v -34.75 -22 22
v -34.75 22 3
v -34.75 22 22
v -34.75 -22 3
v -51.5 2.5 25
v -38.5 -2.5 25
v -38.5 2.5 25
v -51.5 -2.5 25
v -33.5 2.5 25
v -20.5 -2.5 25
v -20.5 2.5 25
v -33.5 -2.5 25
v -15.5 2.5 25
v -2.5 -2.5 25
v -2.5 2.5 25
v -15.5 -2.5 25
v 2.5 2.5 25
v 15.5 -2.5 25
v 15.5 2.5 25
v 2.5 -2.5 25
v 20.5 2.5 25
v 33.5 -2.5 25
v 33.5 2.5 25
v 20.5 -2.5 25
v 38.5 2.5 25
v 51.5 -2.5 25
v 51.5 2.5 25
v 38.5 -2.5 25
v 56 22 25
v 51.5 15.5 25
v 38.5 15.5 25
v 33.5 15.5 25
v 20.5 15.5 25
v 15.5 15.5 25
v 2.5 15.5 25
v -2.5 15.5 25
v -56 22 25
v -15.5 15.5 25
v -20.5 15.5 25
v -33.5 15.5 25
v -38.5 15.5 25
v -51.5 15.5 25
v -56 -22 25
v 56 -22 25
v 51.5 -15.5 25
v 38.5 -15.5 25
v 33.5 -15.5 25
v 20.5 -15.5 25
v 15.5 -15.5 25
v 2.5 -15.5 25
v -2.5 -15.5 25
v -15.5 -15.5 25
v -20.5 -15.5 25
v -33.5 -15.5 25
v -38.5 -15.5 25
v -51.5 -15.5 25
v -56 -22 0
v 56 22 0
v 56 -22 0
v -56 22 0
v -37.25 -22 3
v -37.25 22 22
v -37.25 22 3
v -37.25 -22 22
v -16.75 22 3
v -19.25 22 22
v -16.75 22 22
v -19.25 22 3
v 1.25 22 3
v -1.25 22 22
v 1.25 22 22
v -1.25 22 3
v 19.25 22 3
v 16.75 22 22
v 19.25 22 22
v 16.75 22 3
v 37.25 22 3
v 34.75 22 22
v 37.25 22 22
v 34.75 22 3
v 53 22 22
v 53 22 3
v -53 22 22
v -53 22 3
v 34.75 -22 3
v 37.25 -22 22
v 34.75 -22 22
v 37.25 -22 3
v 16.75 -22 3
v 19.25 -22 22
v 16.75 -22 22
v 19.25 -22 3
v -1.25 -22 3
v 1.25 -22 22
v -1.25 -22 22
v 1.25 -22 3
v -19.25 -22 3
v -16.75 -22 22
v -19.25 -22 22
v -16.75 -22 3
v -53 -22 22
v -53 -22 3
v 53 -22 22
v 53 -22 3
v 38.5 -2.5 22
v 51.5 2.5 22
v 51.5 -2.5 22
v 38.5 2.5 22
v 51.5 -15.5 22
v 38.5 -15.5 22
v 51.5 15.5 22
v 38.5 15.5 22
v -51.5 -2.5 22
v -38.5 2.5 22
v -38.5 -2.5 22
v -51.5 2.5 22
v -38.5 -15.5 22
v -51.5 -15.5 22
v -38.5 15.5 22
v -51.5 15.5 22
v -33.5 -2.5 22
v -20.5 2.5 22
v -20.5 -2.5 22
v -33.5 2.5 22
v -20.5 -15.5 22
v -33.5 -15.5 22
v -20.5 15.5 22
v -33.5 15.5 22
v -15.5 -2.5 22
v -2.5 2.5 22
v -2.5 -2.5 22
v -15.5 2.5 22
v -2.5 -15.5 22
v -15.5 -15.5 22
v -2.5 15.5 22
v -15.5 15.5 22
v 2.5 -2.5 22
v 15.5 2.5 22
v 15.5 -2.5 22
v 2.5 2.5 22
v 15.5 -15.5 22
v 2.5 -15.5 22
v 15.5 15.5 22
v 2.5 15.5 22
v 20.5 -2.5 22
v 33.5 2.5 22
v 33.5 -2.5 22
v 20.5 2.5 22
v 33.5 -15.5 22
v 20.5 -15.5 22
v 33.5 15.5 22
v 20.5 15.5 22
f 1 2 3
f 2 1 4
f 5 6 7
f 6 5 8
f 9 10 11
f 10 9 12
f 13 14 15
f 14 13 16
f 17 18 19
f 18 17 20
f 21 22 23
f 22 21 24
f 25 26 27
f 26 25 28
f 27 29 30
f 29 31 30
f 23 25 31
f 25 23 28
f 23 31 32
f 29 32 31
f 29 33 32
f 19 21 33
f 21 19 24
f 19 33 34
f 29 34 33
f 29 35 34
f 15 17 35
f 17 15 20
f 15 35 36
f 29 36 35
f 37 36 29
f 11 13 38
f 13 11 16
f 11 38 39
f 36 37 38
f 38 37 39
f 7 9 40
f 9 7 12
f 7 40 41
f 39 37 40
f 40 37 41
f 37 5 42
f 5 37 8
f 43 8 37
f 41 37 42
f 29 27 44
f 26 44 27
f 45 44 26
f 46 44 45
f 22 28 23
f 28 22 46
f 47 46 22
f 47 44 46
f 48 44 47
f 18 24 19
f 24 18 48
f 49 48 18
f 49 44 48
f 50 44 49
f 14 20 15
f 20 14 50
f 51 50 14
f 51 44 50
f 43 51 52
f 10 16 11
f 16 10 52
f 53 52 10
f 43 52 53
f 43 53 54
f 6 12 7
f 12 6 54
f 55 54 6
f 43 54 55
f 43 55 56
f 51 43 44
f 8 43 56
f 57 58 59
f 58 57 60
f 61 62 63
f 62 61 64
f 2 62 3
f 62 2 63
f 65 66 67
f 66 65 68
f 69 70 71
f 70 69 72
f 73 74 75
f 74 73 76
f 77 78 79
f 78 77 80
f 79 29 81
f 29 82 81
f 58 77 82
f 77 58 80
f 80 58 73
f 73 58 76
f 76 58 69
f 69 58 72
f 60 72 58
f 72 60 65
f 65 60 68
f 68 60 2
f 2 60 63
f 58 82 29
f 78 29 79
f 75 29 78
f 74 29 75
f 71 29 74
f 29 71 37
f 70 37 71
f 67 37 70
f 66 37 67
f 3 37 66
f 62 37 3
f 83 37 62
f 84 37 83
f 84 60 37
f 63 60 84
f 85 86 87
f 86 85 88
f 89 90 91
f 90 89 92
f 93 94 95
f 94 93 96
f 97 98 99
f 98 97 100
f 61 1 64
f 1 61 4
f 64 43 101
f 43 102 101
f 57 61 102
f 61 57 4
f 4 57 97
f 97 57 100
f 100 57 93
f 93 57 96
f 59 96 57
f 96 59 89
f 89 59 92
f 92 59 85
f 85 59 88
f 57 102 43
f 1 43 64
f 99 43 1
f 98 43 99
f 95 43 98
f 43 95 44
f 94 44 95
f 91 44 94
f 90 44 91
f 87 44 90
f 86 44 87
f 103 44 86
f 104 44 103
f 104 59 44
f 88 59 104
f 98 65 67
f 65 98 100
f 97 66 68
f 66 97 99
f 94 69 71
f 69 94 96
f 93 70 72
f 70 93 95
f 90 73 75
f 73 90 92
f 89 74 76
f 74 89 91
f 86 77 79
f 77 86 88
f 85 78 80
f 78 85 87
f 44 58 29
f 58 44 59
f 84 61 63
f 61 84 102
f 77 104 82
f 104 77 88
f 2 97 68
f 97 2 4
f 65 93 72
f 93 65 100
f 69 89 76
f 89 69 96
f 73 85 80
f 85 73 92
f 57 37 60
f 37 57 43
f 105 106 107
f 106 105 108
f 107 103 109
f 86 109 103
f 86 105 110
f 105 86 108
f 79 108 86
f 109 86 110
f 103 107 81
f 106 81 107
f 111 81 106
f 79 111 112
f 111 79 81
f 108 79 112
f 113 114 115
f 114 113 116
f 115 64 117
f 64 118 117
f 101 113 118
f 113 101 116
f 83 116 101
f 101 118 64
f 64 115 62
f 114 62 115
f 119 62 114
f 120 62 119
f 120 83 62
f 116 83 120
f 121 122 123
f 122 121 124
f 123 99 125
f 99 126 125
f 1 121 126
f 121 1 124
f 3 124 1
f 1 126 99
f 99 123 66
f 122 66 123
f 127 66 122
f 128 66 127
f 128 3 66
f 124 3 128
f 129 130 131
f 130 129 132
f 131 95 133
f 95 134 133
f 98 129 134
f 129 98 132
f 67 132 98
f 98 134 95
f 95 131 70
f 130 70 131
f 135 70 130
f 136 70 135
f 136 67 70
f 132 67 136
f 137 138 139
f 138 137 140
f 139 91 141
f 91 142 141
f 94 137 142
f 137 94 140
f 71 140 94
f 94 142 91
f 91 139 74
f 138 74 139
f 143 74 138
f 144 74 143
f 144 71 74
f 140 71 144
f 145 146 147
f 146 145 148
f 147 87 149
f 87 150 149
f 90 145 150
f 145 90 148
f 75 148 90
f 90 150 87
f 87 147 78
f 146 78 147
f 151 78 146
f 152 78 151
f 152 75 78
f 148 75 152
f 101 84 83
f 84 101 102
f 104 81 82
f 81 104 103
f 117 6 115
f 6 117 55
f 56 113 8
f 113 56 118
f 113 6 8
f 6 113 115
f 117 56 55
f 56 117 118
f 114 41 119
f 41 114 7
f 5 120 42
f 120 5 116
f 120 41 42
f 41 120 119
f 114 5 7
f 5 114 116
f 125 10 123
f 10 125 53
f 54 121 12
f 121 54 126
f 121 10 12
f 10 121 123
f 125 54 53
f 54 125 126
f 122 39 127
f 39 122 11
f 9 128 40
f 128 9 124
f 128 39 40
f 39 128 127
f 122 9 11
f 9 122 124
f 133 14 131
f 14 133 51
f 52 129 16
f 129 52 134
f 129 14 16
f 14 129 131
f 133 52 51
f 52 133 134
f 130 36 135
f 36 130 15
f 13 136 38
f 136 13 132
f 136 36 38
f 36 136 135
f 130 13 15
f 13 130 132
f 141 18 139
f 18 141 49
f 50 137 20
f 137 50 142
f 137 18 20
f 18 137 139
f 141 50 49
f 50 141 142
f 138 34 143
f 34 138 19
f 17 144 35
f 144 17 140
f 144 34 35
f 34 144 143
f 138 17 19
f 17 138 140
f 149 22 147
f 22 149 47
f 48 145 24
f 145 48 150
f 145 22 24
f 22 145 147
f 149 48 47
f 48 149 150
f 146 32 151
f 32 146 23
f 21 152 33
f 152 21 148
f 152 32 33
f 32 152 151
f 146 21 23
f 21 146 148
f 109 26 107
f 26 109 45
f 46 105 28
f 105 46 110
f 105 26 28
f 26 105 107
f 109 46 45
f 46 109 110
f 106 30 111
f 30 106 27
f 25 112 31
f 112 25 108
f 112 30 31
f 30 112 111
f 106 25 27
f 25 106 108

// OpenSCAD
// --- Dimensions ---
base_width_x = 112;          // X dimension of base and deck
base_depth_y = 44;           // Y dimension of base and deck
base_thickness = 3;          // Thickness of base plate
deck_z_start = 22;           // Z position where deck starts
deck_thickness = 3;          // Thickness of deck plate
total_height = 25;           // Total height of the rack

wall_end_thickness = 3;       // Thickness of the two end walls
wall_rib_thickness = 2.5;     // Thickness of the five internal ribs
wall_depth = 44;             // Depth of the walls (Y direction)

// Hole dimensions
hole_size = 13;              // Size of the square cuvette holes
hole_spacing_x = 18;         // Center-to-center spacing X
hole_spacing_y = 18;         // Center-to-center spacing Y
holes_per_row = 6;           // Number of holes along X
rows = 2;                    // Number of rows along Y

// --- Constants ---
$fn = 64;

// --- Helper Modules ---

// Module to create the main structural body
module rack_structure() {
    union() {
        // Base Plate
        translate([-base_width_x/2, -base_depth_y/2, 0])
            cube([base_width_x, base_depth_y, base_thickness]);
        
        // Deck Plate
        translate([-base_width_x/2, -base_depth_y/2, deck_z_start])
            cube([base_width_x, base_depth_y, deck_thickness]);
        
        // End Walls (Flush with short ends)
        // Left Wall
        translate([-base_width_x/2, -base_depth_y/2, 0])
            cube([wall_end_thickness, base_depth_y, total_height]);
        // Right Wall
        translate([base_width_x/2 - wall_end_thickness, -base_depth_y/2, 0])
            cube([wall_end_thickness, base_depth_y, total_height]);
            
        // Internal Ribs
        // Rib positions provided: -36, -18, 0, 18, 36
        for (rx = [-36, -18, 0, 18, 36]) {
            translate([rx - wall_rib_thickness/2, -base_depth_y/2, 0])
                cube([wall_rib_thickness, base_depth_y, total_height]);
        }
    }
}

// Module to create the holes to be subtracted
module holes_to_cut() {
    // The prompt specifies 12 holes (2 rows of 6)
    // Spacing is 18mm center-to-center.
    // To center a grid of 6 holes with 18mm spacing:
    // The distance from the center of the first hole to the center of the last hole is (6-1)*18 = 90mm.
    // The holes are centered on the deck.
    
    for (i = [0 : holes_per_row - 1]) {
        for (j = [0 : rows - 1]) {
            // Calculate X position: center of deck (0) + (i - (count-1)/2) * spacing
            // For i=0: 0 + (0 - 2.5)*18 = -45
            // For i=5: 0 + (5 - 2.5)*18 = +45
            x_pos = (i - (holes_per_row - 1) / 2.0) * hole_spacing_x;
            
            // Calculate Y position: center of deck (0) + (j - (count-1)/2) * spacing
            // For j=0: 0 + (0 - 0.5)*18 = -9
            // For j=1: 0 + (1 - 0.5)*18 = +9
            y_pos = (j - (rows - 1) / 2.0) * hole_spacing_y;
            
            // Subtracting through the deck plate (z=22 to z=25)
            // We extend the cutting cube slightly to ensure clean cuts
            translate([x_pos - hole_size/2, y_pos - hole_size/2, deck_z_start - 0.1])
                cube([hole_size, hole_size, deck_thickness + 0.2]);
        }
    }
}

// --- Final Assembly ---

difference() {
    // The solid part
    rack_structure();
    
    // The holes cut through the deck
    holes_to_cut();
}
